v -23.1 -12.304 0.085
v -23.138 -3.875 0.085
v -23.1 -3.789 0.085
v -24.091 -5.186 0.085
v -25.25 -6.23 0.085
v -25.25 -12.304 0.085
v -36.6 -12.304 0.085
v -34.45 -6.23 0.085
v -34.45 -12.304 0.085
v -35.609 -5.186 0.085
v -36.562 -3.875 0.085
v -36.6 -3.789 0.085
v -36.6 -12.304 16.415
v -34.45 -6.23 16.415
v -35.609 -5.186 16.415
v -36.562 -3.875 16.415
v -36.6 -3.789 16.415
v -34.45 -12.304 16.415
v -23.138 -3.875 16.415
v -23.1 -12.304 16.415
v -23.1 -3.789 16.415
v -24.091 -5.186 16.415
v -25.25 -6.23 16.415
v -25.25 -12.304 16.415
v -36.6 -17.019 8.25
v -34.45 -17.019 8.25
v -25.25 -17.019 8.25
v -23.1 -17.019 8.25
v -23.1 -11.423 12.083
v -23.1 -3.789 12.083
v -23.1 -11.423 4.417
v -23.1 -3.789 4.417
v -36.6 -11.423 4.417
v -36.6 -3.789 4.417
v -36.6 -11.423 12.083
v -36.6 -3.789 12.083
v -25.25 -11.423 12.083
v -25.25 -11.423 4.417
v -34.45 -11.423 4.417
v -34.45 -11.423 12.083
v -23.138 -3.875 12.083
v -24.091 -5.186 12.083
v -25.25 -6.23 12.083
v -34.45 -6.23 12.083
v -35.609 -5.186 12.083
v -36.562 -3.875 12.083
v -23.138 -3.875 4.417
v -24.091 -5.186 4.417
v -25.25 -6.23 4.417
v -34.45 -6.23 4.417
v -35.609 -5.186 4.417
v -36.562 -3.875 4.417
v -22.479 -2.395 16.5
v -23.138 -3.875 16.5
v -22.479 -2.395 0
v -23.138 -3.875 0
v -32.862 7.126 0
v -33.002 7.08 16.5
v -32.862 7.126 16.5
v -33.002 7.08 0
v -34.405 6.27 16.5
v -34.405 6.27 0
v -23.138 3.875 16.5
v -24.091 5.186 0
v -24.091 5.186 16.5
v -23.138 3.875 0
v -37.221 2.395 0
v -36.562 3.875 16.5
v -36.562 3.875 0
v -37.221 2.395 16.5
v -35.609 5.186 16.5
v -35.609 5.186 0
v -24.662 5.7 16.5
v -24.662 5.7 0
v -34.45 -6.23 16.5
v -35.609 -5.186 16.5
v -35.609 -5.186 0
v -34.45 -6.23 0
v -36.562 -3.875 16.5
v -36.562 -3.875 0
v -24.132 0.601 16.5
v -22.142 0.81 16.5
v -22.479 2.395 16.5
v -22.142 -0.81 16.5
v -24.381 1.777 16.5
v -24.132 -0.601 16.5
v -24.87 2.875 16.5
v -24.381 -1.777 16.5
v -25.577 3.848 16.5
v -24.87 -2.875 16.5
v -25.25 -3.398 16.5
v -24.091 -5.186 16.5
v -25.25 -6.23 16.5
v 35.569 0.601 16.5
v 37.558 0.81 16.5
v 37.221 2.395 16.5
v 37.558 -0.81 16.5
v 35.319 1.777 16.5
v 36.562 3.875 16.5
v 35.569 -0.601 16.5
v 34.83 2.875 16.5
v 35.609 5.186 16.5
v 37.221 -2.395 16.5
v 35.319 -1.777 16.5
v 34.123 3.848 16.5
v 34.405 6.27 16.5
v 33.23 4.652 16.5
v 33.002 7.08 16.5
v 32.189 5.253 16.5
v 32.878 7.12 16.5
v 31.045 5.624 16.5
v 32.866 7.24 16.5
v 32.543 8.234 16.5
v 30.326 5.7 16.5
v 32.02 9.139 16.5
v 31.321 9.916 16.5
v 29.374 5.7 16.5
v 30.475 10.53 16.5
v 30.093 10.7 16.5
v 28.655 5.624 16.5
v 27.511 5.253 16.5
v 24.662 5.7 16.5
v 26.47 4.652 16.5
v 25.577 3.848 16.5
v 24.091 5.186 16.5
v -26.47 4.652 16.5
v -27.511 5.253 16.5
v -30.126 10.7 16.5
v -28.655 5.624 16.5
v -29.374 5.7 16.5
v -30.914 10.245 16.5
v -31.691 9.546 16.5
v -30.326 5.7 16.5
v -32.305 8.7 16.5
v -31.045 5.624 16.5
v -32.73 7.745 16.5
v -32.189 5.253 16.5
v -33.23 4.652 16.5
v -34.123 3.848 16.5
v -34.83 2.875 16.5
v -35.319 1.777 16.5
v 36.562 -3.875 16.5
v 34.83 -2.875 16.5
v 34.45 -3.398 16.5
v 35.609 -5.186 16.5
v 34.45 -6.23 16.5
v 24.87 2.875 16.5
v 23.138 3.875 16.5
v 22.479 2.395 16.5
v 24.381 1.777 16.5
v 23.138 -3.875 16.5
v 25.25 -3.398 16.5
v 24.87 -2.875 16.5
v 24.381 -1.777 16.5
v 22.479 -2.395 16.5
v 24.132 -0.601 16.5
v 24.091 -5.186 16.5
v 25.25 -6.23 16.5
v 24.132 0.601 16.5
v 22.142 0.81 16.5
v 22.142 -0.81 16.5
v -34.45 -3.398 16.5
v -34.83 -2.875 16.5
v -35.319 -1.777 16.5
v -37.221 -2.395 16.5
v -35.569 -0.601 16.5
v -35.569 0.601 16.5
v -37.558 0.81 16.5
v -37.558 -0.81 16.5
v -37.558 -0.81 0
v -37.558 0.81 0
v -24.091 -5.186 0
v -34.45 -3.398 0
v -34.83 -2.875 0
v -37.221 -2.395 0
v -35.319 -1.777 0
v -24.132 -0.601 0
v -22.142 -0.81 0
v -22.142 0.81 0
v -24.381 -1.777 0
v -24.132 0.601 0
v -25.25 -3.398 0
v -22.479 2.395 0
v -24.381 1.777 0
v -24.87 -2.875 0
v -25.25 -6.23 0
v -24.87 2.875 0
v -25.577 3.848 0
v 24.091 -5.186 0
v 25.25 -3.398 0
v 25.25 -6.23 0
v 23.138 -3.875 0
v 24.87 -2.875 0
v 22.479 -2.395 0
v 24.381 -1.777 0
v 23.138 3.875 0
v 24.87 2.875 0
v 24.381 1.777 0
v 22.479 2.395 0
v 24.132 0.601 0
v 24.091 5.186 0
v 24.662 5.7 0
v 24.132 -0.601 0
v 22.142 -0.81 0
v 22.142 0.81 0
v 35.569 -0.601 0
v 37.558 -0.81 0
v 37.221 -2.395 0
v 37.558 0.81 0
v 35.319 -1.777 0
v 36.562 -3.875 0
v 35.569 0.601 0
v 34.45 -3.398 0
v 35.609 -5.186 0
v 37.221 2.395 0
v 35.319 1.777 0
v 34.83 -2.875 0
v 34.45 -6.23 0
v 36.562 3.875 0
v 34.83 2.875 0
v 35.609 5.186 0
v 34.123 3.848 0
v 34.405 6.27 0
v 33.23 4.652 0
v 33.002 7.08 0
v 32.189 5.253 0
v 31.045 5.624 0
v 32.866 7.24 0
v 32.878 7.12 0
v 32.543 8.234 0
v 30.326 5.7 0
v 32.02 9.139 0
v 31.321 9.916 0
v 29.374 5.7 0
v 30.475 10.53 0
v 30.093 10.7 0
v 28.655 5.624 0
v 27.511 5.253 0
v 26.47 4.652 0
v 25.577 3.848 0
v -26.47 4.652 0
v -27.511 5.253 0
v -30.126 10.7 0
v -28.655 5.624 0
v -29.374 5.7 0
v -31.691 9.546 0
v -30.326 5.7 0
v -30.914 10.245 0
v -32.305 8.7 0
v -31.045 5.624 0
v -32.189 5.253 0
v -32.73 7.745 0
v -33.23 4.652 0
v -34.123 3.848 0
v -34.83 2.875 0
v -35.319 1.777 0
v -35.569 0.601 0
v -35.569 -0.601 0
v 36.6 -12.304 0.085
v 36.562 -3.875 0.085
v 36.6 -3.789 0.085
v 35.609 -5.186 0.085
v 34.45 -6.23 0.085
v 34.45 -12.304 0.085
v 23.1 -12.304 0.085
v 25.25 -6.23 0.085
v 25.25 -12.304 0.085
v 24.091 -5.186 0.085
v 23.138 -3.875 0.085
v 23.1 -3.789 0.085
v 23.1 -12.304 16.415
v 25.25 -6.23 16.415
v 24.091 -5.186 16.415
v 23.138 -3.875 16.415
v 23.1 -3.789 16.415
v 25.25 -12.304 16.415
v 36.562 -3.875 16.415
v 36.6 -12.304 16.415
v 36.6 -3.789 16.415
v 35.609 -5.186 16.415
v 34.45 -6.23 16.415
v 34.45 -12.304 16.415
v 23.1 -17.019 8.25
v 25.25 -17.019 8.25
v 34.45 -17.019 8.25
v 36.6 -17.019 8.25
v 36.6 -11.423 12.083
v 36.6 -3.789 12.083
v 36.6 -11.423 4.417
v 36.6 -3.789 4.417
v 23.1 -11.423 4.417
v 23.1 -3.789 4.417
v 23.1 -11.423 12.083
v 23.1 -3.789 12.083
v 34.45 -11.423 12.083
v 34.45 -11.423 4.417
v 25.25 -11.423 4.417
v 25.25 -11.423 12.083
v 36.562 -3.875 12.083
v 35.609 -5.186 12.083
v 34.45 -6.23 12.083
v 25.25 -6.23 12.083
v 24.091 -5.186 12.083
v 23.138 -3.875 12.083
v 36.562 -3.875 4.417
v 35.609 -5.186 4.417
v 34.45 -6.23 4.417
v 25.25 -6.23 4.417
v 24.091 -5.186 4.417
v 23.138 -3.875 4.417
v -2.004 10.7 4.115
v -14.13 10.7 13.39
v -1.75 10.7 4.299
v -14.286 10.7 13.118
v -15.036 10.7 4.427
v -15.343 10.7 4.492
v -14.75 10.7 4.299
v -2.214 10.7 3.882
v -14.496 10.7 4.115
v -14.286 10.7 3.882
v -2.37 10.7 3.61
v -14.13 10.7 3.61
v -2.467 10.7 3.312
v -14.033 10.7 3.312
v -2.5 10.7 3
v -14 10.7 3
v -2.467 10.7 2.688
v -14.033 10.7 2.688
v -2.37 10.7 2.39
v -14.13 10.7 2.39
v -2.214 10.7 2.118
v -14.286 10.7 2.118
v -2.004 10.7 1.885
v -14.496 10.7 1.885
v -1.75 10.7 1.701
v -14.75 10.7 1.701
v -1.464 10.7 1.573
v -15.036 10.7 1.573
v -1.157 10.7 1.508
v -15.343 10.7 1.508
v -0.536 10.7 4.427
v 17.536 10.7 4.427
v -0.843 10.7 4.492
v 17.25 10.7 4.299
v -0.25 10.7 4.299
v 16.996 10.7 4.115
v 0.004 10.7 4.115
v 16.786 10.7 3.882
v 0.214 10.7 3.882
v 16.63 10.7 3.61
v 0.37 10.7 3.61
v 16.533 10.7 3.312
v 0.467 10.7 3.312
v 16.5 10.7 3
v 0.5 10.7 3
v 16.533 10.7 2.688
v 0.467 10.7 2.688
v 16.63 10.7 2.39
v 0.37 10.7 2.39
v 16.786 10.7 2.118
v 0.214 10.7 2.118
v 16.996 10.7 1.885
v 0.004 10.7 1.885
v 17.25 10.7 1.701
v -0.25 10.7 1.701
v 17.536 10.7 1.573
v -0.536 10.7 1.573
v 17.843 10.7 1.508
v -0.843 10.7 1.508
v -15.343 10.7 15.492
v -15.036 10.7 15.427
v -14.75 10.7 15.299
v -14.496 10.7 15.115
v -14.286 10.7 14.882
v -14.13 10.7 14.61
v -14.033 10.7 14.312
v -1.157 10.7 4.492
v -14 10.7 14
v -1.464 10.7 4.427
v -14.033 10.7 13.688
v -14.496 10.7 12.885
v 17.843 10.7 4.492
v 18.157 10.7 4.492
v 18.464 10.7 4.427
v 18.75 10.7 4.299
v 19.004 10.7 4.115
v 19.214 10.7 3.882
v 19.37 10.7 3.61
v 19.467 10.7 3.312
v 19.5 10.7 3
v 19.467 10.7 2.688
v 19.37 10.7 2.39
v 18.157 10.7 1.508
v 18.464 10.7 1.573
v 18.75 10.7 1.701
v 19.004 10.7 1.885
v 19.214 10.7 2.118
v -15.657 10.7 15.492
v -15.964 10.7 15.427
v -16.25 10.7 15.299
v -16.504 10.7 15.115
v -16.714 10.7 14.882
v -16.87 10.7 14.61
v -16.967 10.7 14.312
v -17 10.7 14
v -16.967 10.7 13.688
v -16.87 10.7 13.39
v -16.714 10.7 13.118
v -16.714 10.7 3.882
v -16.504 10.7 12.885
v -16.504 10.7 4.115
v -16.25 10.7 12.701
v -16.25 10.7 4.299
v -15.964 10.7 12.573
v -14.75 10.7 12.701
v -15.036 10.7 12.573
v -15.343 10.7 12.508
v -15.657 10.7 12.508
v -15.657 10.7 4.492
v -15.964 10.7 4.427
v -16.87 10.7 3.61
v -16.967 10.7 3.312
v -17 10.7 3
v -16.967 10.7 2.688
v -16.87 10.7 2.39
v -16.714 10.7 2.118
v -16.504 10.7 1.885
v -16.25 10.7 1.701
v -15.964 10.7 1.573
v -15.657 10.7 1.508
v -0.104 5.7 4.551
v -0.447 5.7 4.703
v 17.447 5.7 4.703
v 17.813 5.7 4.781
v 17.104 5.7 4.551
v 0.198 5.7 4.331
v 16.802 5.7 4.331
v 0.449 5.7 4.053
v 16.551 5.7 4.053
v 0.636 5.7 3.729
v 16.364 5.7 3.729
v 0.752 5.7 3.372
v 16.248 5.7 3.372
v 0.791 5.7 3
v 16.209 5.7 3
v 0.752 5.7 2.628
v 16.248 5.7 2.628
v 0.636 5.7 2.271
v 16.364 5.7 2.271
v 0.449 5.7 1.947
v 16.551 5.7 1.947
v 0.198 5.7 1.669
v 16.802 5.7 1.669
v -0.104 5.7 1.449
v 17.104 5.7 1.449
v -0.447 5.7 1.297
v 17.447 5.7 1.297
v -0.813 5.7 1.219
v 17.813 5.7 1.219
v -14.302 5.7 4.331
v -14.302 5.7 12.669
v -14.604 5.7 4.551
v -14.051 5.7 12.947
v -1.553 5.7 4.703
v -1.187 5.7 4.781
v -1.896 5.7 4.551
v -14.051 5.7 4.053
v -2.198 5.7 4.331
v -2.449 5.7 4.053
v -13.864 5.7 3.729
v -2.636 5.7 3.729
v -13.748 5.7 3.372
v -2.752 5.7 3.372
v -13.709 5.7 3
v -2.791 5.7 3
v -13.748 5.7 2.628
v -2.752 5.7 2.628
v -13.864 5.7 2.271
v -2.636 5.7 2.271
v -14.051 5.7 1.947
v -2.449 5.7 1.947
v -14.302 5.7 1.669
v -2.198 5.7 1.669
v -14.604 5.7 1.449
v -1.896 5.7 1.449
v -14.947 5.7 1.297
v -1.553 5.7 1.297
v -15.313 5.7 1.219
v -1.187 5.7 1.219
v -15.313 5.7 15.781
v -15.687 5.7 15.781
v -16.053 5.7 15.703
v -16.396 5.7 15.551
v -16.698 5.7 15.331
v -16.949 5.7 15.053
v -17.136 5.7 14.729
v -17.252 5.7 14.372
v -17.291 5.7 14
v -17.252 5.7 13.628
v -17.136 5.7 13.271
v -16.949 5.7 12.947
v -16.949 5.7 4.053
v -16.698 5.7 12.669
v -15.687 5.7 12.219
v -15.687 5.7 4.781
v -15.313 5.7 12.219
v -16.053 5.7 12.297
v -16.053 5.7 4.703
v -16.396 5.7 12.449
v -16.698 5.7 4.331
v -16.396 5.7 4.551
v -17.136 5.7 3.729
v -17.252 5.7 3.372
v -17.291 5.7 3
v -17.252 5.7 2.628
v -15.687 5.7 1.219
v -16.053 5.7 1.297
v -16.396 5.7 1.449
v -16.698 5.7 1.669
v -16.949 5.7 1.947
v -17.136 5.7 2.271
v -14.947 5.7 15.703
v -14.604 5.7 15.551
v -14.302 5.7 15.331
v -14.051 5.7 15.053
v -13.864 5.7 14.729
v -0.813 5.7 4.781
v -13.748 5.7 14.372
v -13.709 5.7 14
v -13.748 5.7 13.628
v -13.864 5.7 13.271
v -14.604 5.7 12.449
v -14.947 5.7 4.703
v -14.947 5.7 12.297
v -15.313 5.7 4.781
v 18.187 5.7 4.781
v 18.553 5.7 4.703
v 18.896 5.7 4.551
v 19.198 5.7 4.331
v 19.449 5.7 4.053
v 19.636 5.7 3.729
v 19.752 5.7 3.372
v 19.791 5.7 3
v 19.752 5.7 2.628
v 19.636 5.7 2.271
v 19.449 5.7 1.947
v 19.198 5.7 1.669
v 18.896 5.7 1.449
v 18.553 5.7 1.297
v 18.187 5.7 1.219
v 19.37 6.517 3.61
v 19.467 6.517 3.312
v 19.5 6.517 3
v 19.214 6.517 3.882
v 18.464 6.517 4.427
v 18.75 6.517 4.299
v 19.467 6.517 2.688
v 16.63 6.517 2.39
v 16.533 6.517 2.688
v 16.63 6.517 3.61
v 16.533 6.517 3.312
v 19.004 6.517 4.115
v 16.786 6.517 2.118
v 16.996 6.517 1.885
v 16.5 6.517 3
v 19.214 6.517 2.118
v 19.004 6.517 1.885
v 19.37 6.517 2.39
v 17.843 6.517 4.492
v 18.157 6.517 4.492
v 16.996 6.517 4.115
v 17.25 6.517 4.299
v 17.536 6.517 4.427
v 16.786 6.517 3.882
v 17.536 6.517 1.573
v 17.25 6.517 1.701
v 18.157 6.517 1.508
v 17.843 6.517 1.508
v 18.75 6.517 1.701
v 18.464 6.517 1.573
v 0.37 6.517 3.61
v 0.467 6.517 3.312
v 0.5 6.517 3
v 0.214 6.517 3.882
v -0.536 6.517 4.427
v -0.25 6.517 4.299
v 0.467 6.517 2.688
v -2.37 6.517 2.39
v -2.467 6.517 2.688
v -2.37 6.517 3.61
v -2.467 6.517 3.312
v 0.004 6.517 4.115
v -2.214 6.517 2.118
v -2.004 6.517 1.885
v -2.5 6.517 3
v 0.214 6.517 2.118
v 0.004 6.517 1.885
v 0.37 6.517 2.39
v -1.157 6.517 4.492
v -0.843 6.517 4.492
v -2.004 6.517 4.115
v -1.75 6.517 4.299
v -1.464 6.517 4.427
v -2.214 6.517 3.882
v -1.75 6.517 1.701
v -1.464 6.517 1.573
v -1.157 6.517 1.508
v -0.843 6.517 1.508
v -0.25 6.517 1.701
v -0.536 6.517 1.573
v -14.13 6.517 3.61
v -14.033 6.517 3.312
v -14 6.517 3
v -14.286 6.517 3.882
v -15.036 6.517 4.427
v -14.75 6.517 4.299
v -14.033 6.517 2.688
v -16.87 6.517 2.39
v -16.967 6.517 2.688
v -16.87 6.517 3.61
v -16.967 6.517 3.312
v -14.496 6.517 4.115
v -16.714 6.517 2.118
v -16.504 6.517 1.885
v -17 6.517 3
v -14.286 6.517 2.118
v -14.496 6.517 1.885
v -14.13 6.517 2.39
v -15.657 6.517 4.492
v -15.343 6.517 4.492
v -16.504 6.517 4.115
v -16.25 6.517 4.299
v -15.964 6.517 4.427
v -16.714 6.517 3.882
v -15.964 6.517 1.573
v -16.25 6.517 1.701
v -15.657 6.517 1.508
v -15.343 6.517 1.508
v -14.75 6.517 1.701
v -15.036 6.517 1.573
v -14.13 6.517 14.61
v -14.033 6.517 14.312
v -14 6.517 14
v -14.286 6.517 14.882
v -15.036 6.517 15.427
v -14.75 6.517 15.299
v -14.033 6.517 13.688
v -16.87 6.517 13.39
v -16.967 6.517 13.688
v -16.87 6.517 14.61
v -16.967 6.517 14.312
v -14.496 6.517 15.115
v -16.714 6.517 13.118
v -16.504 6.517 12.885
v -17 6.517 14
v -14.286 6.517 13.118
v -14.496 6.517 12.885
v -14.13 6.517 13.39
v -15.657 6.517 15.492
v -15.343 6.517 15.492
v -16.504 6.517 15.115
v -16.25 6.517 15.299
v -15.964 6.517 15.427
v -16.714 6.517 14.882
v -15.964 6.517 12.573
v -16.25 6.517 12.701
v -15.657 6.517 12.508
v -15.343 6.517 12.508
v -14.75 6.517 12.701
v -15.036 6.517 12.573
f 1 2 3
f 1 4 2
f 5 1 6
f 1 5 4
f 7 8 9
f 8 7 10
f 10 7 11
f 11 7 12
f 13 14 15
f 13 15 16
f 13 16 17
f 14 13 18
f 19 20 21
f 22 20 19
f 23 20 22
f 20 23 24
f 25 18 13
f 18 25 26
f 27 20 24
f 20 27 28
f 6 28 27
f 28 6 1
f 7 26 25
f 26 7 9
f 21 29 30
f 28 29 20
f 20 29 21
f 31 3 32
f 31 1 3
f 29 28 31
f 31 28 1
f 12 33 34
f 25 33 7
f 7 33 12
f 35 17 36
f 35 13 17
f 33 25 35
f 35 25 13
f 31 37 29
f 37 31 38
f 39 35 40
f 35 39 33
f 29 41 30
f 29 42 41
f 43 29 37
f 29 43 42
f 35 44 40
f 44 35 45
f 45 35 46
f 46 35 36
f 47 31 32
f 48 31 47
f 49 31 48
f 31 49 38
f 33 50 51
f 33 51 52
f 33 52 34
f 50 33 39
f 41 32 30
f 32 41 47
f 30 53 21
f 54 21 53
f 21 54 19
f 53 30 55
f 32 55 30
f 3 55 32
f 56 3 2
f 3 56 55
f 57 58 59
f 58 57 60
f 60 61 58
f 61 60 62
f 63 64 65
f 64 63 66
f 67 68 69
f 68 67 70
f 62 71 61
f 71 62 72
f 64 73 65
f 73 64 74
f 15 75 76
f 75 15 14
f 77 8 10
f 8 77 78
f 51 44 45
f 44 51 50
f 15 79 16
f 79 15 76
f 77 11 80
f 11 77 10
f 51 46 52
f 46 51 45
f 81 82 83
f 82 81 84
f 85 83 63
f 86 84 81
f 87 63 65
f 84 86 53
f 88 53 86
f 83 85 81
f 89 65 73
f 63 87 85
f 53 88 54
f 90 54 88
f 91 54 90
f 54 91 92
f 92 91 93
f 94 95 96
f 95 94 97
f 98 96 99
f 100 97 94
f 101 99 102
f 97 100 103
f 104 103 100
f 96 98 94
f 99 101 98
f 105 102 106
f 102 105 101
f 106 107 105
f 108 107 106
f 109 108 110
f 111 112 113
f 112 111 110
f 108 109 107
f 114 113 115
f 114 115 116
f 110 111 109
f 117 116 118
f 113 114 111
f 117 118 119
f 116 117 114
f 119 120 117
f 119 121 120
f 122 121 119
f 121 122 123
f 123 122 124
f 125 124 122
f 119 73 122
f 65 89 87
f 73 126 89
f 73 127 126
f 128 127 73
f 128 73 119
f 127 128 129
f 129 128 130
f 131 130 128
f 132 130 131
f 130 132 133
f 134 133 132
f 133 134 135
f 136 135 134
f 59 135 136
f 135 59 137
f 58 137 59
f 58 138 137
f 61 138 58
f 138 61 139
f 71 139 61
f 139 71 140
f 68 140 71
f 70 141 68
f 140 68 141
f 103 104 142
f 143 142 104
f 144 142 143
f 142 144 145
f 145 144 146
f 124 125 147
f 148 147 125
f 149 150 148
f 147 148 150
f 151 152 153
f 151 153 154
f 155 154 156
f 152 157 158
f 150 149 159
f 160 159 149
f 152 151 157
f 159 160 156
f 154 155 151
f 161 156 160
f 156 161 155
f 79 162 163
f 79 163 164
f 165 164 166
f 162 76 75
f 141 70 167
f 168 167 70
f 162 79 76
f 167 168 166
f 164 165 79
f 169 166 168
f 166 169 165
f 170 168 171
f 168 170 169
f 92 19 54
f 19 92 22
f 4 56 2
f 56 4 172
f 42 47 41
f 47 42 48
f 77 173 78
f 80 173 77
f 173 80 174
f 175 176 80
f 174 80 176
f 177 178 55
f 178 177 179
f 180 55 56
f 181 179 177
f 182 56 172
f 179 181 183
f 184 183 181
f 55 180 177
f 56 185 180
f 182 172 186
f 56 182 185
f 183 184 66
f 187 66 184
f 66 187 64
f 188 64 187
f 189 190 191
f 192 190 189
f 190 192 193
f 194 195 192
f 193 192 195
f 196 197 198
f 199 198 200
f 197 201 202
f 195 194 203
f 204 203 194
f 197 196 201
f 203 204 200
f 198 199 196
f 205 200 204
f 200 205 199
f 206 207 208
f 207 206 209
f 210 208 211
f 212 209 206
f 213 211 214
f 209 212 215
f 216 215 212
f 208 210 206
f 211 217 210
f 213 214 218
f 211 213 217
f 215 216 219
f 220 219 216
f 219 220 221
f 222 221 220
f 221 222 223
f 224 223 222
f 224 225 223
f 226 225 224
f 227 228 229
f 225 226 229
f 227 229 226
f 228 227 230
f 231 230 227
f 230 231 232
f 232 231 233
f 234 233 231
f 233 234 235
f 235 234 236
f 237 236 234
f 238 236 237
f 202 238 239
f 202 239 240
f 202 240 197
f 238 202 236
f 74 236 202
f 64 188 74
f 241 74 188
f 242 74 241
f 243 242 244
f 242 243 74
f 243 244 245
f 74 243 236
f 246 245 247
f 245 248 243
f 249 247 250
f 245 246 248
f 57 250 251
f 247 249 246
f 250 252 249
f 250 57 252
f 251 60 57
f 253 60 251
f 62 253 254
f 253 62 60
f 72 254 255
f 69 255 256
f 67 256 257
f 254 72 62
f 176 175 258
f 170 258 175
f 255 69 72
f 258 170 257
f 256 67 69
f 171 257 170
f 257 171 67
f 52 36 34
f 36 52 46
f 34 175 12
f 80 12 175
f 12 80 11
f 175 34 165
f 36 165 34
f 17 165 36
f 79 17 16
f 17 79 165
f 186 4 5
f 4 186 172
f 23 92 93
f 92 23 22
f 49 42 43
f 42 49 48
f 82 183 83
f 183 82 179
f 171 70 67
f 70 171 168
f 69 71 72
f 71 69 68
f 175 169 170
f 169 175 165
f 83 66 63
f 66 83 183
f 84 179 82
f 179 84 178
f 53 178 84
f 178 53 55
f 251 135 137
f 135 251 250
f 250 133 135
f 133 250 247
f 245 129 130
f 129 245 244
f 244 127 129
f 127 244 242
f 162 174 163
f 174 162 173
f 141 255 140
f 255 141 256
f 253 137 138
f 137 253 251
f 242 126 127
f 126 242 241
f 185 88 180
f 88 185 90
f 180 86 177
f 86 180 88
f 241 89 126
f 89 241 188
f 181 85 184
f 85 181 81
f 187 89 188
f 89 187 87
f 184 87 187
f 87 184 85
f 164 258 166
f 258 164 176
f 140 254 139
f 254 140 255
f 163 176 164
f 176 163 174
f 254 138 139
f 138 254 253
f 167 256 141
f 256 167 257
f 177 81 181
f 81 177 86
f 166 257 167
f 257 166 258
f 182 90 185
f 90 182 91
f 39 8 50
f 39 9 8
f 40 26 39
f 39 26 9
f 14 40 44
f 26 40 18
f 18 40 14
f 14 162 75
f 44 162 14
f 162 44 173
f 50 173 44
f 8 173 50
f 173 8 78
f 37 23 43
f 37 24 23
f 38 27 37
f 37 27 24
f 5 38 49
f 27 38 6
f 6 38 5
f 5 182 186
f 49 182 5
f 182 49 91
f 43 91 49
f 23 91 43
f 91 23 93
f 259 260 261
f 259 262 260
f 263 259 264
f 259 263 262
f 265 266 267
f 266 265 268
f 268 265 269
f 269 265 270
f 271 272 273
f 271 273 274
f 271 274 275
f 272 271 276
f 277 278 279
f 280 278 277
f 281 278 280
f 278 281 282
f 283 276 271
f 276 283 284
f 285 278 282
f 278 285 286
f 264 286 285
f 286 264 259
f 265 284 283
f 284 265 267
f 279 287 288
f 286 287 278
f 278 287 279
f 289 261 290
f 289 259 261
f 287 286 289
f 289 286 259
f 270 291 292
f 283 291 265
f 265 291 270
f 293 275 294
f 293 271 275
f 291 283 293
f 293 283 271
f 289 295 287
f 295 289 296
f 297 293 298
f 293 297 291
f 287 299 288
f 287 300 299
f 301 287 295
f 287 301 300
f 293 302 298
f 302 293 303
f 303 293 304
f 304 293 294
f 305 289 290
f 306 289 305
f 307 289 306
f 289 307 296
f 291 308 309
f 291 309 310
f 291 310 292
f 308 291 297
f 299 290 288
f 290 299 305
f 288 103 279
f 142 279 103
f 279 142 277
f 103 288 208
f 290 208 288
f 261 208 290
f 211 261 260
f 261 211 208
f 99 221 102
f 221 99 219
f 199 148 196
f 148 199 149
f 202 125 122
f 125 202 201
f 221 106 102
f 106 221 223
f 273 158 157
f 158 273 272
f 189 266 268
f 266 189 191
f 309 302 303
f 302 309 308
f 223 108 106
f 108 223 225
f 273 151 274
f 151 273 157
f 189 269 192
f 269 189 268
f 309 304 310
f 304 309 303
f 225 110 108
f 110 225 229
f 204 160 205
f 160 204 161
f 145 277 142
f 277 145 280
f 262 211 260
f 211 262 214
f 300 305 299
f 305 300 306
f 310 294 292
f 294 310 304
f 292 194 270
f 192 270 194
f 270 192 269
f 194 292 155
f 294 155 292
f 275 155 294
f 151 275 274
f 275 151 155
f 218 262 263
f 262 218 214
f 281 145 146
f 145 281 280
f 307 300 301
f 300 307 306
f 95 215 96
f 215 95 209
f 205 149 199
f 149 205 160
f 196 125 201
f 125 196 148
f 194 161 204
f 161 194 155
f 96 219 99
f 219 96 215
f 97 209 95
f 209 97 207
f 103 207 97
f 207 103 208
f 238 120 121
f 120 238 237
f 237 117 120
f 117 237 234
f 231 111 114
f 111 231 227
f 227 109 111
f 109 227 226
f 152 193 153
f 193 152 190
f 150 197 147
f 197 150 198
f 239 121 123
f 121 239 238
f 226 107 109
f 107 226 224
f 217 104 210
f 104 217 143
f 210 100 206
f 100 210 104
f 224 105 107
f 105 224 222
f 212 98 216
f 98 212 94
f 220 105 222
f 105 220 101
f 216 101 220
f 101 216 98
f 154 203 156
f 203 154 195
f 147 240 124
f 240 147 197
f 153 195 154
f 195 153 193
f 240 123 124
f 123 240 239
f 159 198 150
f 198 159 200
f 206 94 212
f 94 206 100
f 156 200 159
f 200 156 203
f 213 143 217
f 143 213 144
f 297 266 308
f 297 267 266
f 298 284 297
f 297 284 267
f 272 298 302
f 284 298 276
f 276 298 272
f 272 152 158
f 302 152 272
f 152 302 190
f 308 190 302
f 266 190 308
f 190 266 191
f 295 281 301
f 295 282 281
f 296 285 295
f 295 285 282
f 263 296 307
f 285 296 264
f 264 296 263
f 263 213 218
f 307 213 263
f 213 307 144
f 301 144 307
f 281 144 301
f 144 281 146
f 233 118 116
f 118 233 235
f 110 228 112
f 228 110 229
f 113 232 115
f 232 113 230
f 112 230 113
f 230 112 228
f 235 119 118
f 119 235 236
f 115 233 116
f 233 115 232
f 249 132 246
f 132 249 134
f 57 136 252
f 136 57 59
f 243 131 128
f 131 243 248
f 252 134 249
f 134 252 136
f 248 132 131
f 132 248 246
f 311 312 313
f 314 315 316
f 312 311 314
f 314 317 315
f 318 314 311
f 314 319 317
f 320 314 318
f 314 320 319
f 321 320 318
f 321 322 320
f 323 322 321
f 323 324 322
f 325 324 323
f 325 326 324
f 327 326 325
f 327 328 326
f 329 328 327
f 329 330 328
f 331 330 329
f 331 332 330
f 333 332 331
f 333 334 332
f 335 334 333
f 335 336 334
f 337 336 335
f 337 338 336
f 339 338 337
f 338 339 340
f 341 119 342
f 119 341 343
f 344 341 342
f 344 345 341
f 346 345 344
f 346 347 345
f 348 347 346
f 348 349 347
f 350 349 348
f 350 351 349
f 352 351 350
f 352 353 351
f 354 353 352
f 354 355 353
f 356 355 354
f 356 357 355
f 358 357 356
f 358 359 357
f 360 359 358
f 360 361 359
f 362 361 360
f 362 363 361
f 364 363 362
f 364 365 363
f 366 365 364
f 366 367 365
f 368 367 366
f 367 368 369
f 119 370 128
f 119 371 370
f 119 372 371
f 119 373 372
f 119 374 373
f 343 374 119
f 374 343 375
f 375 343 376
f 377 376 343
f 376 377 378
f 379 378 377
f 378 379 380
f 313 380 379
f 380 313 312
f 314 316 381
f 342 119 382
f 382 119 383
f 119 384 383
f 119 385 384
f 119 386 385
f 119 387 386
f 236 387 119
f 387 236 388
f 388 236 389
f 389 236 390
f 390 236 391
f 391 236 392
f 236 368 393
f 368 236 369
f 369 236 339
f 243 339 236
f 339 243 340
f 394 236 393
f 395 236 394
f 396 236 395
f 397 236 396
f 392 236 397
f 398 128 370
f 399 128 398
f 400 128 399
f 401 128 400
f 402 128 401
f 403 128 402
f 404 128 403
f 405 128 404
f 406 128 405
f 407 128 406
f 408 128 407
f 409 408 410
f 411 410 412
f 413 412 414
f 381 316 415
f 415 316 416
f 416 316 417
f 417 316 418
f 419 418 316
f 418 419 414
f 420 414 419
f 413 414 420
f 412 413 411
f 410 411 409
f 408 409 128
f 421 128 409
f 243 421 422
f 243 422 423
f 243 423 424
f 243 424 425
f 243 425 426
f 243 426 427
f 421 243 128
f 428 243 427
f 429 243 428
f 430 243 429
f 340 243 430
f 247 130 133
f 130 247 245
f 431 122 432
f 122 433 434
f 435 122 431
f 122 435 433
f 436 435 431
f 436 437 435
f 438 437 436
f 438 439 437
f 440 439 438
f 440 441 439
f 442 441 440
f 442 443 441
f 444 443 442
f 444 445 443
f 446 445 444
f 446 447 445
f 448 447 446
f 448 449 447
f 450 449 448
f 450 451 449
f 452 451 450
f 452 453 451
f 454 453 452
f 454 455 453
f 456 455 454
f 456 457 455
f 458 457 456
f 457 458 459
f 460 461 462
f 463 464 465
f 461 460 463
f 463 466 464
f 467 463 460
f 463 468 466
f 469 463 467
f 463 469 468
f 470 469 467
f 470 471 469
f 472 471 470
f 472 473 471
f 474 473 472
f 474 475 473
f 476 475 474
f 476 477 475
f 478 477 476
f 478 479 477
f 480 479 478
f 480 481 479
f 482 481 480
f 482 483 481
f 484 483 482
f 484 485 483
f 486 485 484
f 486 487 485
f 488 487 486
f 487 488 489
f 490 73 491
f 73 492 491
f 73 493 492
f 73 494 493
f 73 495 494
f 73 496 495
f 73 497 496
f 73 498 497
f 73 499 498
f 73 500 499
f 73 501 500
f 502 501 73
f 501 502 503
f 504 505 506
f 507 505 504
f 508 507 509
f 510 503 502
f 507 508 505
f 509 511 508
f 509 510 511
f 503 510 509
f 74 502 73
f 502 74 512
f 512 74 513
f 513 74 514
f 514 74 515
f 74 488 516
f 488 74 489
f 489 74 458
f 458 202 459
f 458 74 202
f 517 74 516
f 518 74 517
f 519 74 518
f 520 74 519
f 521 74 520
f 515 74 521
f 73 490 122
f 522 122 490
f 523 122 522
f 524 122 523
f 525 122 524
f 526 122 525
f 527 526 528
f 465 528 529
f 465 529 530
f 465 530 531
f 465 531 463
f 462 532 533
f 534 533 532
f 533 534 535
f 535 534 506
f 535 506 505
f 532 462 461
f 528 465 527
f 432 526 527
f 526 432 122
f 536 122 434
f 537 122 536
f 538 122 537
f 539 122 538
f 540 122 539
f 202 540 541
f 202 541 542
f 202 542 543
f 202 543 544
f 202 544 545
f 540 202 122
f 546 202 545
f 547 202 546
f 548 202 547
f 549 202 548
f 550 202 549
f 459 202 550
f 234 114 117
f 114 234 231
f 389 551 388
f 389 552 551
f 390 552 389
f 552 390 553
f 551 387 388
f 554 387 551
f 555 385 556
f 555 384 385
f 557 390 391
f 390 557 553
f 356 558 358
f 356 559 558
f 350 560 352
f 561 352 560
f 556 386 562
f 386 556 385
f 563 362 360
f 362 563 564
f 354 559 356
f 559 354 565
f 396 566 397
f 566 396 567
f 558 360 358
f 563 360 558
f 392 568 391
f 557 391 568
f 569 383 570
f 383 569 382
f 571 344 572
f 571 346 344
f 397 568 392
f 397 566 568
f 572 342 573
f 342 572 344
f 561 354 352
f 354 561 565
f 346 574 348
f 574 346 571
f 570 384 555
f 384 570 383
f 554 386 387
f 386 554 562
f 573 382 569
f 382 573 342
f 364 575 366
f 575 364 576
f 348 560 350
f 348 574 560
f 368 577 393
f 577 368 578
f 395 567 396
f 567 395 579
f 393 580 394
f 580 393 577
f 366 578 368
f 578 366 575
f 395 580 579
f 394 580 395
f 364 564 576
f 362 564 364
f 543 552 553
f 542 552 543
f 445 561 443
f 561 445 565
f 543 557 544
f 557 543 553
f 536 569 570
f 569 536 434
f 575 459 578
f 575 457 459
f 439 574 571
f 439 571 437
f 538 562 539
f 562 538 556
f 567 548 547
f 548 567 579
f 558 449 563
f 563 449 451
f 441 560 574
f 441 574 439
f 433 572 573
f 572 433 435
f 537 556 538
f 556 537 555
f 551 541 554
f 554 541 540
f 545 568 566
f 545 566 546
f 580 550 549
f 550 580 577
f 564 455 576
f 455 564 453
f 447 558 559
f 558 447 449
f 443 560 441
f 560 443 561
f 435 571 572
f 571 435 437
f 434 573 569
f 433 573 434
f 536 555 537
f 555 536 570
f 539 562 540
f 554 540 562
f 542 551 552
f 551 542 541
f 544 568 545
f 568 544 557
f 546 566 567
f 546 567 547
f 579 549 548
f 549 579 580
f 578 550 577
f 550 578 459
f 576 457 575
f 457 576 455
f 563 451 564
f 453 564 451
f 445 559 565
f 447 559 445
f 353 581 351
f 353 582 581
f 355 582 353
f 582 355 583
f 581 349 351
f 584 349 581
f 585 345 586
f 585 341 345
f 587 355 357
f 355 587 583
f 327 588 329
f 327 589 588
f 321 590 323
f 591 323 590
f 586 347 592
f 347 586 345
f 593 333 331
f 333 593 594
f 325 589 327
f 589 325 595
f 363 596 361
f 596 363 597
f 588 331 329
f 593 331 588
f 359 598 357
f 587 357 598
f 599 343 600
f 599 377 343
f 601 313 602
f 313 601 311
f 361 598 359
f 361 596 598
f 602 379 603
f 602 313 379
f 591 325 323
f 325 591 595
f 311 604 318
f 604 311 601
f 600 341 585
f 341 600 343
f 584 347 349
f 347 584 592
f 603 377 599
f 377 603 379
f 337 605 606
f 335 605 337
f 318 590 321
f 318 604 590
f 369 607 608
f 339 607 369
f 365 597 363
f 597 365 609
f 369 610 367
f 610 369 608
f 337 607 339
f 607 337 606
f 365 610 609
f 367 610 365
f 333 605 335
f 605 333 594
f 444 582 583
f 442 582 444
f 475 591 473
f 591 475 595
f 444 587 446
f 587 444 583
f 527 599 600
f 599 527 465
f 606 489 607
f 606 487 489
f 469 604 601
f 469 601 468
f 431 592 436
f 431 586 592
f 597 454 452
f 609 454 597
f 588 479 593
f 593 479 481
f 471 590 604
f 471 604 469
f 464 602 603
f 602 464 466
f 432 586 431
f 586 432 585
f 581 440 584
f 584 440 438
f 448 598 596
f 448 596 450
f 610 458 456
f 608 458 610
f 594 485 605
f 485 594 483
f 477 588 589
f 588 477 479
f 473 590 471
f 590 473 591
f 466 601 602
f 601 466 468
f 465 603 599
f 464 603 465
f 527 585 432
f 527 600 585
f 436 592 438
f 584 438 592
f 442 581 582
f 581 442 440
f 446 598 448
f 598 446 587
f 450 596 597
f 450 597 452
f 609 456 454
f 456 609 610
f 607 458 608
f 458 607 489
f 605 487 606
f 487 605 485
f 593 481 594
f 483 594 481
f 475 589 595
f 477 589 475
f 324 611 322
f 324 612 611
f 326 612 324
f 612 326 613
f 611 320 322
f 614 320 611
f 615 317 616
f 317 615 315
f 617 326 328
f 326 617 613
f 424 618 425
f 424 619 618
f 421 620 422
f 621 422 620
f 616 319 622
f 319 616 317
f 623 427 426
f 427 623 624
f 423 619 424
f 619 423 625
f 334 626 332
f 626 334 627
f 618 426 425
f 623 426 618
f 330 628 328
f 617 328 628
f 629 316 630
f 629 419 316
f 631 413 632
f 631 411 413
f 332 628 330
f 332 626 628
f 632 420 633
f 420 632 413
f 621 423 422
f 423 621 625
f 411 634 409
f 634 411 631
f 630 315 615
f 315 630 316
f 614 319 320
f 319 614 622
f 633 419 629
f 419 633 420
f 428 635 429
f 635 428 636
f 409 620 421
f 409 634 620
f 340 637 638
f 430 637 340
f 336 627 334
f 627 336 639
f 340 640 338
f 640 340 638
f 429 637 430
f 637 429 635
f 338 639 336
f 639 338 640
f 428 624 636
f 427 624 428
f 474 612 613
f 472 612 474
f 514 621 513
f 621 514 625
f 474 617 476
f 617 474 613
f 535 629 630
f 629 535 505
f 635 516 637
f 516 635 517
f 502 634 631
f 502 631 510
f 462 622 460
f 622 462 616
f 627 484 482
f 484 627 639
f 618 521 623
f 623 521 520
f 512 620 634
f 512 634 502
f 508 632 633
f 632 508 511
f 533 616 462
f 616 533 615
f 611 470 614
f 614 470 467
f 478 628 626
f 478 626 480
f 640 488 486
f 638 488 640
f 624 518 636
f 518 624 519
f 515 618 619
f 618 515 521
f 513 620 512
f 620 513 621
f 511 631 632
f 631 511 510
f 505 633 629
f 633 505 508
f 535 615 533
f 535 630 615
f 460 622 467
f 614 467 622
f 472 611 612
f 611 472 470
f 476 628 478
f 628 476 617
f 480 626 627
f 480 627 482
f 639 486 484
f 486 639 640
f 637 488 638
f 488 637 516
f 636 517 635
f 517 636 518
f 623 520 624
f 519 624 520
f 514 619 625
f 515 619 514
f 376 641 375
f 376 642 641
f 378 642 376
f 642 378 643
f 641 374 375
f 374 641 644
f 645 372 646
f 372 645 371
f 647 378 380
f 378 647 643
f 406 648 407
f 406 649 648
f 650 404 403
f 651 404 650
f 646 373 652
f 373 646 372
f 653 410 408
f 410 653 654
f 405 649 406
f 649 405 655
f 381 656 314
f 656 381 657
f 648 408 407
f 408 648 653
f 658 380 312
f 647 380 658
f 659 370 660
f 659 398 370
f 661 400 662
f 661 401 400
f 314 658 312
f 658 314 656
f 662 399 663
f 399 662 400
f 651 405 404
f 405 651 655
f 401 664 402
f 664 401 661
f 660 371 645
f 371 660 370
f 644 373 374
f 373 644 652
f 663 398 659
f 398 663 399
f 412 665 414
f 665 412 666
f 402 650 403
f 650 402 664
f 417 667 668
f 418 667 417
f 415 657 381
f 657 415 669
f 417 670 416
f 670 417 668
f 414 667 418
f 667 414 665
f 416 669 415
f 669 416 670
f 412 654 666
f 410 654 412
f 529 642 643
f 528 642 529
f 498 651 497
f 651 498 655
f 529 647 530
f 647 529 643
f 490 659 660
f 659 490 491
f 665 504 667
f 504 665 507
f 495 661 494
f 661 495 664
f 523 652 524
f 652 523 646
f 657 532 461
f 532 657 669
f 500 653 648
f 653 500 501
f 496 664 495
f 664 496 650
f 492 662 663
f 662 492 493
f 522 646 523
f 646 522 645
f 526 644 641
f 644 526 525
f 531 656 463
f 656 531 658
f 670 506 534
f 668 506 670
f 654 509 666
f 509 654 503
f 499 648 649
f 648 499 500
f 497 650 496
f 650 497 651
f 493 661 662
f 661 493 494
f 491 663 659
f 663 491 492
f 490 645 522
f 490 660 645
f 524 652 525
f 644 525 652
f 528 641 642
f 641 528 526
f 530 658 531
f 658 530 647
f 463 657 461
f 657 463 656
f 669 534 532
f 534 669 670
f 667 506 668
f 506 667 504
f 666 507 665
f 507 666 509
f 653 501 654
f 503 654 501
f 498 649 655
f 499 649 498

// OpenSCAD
// universal endstop holder for rostock delta printer
// by zeus - zeus@ctdo.de - 2014-09-21
//
// edit "module wall" for your needs if not using "sainsmart mechaical endstop pcb"
// for further instructions look at the comments above the "wall"-module in this code.
//
use <Write.scad>
// ===================================================================
//
//rod-diameter, set a bit thicker than the rod really is
	rod_dia=11.5; // old 8.5

//center-to-center distance of the rods; set a bit smaller than the original 60 to keep the bearings smooth
	rod_distance=59.7; 

// overall thickness
	material_t=2.0;

// mounting-wall thickness
	wall_t=5;

//overall height
	holder_h=16.5;

//diameter of the holes
	hole_dia=3;

//cone cut-in of the holes for easier screw insertion; set to "0" if not needed
	cut_in=1;	
	
//wall_w=rod_distance-material_t*2+rod_dia/2-1;
wall_w=rod_distance-(rod_dia/2);
$fn=30;

// ===================================================================

module fillet(r, h) {
    translate([r / 2, r / 2, 0])

        difference() {
            cube([r + 0.01, r + 0.01, h], center = true);

            translate([r/2, r/2, 0])
                cylinder(r = r, h = h + 1, center = true);

        }
}


module hex_standoff(){
	rotate([90,0,0]){
		translate([-rod_dia*0.66,holder_h/2,0]){
			difference(){
				cylinder(r=holder_h/1.75,h=rod_dia+material_t,center=true,$fn=6);
				cube([rod_dia/1.5,rod_dia/1.5,rod_dia+material_t],center=true);
			}
		}
	}
}


module clip(){
	difference(){

		union(){
			//outer cylinder
			cylinder(r=rod_dia/2+material_t,h=holder_h);
			//outer hex standoffs
			hex_standoff();
		}

		//inner cylinder
		cylinder(r=rod_dia/2,h=holder_h);
		//cutout
		translate([-rod_dia,0,holder_h/2]){
			cube([rod_dia*2,rod_dia/1.25,holder_h],center=true);
		}
	}
}

module hole(){
	rotate([90,0,0]){
		cylinder(r=hole_dia/2,h=wall_t*2, center=true);
		if (cut_in==1) {
			cylinder(r1=0,r2=hole_dia*0.6,h=wall_t*1.01,center=true);
		}
	}
}

// ===================================================================
// Edit the module below to add the holes you want to appear in the center-part.
// should be mostly self-explaining
//
// 			translate([-22,0,3]){
//				hole();	
//			}
//
// this example code creates a hole, which is moved by -22mm(x), 0mm(y), and 3mm(z) 
// measured from the absolute center of the coordinate-system (enable under "View -> Show Axes"). 
// ===================================================================

module wall(){
	difference(){
		translate([0,8.2,holder_h/2]){
				difference(){
				cube([wall_w+12,wall_t,holder_h],center=true);
				translate([(wall_w+12)/2,3,0]){
					rotate([0,0,180]) {
						fillet(5,holder_h+2);
					}
				};
				translate([-(wall_w+12)/2,3,0]){
					rotate([0,0,270]) {
						fillet(5,holder_h+2);
					}
				}
				}
		}
		union(){
	//		translate([-22,0,3]){
			translate([18,8.2,3]){
				hole();	
			}
	//		translate([-3,0,3]){
			translate([-1,8.2,3]){
				hole();	
			}
	//		translate([11.5,0,3]){
			translate([-15.5,8.2,3]){
				hole();	
			}
	//		translate([11.5,0,14]){
			translate([-15.5,8.2,14]){
				hole();	
			}
			translate([-12,9.19,9]){
				rotate([90,0,0]){
					write("Rossonet RAM",h=4,t=3.5);
				}
			}
		}
	}
}

//left clip
translate([-rod_distance/2,0,0]){
	rotate([0,0,90]){
		clip();
	}
}

//right clip
translate([rod_distance/2,0,0]){
	rotate([0,0,90]){
		clip();
	}
}


//wall
wall();
